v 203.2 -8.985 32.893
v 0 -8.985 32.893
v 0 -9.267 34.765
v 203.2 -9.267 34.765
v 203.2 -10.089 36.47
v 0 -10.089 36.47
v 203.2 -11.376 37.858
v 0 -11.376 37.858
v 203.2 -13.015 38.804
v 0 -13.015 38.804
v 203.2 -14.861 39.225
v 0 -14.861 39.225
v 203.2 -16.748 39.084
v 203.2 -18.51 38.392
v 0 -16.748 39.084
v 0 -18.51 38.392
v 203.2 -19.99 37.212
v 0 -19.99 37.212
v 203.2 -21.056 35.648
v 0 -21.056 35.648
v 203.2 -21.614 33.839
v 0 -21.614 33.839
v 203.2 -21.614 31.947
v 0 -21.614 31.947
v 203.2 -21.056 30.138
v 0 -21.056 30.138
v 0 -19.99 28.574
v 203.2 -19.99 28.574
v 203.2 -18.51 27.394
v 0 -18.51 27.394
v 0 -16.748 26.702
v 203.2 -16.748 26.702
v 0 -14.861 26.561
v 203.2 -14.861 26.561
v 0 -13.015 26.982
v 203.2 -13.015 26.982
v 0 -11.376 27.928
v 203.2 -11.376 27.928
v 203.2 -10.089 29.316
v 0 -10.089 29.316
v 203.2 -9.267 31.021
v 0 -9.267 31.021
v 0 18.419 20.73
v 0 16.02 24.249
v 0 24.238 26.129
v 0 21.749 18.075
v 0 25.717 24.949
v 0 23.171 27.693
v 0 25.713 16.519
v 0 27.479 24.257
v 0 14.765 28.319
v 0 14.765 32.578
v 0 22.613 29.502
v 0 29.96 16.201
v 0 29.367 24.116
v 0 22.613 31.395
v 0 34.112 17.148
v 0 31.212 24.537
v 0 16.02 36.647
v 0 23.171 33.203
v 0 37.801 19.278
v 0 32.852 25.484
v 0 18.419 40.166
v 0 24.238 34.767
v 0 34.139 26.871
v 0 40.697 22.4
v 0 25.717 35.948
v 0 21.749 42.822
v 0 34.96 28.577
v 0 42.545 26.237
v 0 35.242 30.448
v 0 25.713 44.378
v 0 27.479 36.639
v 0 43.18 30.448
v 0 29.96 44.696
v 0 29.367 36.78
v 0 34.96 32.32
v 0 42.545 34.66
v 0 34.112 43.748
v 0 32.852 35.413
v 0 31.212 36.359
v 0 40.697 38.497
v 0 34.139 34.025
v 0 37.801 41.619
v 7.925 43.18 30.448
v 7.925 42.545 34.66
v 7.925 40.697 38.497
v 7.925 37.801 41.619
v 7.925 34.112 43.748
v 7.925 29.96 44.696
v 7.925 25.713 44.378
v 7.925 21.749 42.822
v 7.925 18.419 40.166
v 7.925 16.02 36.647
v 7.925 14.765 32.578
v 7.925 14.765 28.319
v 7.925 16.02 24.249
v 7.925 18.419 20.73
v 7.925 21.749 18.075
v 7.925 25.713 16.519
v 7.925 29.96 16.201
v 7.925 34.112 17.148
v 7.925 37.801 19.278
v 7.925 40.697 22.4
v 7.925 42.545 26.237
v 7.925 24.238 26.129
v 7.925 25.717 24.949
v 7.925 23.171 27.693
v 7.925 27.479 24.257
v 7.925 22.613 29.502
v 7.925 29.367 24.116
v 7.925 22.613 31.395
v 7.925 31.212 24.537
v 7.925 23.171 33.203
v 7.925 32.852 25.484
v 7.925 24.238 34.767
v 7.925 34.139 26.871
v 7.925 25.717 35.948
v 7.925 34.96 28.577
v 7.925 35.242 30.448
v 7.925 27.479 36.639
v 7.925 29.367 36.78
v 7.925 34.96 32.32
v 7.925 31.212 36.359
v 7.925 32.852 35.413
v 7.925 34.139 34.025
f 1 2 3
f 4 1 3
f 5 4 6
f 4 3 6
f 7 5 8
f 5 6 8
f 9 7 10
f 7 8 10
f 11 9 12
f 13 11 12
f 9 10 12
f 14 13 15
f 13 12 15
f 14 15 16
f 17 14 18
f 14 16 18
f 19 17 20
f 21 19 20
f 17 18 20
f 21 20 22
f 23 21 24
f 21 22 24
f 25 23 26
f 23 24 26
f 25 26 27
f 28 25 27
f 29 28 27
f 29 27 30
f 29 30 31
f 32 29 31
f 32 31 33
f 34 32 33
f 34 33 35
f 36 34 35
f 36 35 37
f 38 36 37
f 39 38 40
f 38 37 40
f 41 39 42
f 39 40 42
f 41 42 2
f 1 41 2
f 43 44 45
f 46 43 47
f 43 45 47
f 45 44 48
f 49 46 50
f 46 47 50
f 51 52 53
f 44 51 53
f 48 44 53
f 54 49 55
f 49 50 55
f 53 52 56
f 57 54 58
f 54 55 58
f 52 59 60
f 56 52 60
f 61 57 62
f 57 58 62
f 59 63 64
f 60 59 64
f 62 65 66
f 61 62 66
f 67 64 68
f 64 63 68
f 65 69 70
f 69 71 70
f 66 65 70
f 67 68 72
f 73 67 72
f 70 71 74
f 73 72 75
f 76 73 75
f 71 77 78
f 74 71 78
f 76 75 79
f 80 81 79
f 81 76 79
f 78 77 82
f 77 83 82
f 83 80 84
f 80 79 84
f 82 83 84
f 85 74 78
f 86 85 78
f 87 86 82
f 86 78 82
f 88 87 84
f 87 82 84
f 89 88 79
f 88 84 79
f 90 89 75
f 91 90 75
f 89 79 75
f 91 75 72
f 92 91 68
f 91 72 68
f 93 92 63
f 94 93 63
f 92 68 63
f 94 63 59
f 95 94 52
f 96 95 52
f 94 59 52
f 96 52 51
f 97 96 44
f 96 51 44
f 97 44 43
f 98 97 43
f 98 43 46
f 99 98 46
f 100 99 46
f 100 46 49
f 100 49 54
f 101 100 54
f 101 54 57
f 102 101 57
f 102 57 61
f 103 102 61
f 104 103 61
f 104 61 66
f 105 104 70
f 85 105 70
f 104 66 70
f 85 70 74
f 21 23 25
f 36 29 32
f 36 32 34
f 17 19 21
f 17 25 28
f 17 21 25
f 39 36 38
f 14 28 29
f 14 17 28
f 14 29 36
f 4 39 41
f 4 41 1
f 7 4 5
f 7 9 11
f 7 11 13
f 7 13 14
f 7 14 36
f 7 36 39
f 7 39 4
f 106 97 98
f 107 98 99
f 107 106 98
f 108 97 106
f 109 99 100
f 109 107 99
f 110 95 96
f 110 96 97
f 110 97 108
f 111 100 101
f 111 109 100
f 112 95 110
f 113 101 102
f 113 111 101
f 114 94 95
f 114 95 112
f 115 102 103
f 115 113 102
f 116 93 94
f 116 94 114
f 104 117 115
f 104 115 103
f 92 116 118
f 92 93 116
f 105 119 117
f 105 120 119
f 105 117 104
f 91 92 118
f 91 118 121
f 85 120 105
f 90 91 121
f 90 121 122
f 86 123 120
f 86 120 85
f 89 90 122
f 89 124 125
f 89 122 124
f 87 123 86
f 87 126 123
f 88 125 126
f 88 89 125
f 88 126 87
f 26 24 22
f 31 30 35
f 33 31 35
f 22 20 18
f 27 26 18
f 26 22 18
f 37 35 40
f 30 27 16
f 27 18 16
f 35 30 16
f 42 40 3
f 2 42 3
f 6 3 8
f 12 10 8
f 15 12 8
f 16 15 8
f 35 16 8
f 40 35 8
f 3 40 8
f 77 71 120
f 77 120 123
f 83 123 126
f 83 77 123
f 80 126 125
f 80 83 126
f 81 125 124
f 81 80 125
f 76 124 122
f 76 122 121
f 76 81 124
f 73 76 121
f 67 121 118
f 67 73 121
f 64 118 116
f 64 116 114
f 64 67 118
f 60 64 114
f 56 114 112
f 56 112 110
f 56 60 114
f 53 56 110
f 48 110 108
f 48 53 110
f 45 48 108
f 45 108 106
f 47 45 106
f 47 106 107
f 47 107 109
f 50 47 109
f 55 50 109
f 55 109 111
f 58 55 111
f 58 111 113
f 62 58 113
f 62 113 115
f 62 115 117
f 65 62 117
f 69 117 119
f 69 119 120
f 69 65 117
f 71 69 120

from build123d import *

# Parameters (mm, degrees)
F0_R     = 6.35
F1_DEPTH = 203.2
F2_R     = 14.2875
F2_R_2   = 6.35
F3_DEPTH = 7.9248


with BuildPart() as f1:
    # F0 (on Right) → F1 (new body)
    with BuildSketch(Plane.YZ):
        with Locations((-15.335251, 32.893002)):
            Circle(F0_R)
    extrude(amount=F1_DEPTH)


with BuildPart() as f3:
    # F2 (on Right) → F3 (new body)
    with BuildSketch(Plane.YZ):
        with Locations((28.892498, 30.448252)):
            Circle(F2_R)
        with Locations((28.892498, 30.448252)):
            Circle(F2_R_2, mode=Mode.SUBTRACT)
    extrude(amount=F3_DEPTH)


solid = Compound([f1.part, f3.part])
